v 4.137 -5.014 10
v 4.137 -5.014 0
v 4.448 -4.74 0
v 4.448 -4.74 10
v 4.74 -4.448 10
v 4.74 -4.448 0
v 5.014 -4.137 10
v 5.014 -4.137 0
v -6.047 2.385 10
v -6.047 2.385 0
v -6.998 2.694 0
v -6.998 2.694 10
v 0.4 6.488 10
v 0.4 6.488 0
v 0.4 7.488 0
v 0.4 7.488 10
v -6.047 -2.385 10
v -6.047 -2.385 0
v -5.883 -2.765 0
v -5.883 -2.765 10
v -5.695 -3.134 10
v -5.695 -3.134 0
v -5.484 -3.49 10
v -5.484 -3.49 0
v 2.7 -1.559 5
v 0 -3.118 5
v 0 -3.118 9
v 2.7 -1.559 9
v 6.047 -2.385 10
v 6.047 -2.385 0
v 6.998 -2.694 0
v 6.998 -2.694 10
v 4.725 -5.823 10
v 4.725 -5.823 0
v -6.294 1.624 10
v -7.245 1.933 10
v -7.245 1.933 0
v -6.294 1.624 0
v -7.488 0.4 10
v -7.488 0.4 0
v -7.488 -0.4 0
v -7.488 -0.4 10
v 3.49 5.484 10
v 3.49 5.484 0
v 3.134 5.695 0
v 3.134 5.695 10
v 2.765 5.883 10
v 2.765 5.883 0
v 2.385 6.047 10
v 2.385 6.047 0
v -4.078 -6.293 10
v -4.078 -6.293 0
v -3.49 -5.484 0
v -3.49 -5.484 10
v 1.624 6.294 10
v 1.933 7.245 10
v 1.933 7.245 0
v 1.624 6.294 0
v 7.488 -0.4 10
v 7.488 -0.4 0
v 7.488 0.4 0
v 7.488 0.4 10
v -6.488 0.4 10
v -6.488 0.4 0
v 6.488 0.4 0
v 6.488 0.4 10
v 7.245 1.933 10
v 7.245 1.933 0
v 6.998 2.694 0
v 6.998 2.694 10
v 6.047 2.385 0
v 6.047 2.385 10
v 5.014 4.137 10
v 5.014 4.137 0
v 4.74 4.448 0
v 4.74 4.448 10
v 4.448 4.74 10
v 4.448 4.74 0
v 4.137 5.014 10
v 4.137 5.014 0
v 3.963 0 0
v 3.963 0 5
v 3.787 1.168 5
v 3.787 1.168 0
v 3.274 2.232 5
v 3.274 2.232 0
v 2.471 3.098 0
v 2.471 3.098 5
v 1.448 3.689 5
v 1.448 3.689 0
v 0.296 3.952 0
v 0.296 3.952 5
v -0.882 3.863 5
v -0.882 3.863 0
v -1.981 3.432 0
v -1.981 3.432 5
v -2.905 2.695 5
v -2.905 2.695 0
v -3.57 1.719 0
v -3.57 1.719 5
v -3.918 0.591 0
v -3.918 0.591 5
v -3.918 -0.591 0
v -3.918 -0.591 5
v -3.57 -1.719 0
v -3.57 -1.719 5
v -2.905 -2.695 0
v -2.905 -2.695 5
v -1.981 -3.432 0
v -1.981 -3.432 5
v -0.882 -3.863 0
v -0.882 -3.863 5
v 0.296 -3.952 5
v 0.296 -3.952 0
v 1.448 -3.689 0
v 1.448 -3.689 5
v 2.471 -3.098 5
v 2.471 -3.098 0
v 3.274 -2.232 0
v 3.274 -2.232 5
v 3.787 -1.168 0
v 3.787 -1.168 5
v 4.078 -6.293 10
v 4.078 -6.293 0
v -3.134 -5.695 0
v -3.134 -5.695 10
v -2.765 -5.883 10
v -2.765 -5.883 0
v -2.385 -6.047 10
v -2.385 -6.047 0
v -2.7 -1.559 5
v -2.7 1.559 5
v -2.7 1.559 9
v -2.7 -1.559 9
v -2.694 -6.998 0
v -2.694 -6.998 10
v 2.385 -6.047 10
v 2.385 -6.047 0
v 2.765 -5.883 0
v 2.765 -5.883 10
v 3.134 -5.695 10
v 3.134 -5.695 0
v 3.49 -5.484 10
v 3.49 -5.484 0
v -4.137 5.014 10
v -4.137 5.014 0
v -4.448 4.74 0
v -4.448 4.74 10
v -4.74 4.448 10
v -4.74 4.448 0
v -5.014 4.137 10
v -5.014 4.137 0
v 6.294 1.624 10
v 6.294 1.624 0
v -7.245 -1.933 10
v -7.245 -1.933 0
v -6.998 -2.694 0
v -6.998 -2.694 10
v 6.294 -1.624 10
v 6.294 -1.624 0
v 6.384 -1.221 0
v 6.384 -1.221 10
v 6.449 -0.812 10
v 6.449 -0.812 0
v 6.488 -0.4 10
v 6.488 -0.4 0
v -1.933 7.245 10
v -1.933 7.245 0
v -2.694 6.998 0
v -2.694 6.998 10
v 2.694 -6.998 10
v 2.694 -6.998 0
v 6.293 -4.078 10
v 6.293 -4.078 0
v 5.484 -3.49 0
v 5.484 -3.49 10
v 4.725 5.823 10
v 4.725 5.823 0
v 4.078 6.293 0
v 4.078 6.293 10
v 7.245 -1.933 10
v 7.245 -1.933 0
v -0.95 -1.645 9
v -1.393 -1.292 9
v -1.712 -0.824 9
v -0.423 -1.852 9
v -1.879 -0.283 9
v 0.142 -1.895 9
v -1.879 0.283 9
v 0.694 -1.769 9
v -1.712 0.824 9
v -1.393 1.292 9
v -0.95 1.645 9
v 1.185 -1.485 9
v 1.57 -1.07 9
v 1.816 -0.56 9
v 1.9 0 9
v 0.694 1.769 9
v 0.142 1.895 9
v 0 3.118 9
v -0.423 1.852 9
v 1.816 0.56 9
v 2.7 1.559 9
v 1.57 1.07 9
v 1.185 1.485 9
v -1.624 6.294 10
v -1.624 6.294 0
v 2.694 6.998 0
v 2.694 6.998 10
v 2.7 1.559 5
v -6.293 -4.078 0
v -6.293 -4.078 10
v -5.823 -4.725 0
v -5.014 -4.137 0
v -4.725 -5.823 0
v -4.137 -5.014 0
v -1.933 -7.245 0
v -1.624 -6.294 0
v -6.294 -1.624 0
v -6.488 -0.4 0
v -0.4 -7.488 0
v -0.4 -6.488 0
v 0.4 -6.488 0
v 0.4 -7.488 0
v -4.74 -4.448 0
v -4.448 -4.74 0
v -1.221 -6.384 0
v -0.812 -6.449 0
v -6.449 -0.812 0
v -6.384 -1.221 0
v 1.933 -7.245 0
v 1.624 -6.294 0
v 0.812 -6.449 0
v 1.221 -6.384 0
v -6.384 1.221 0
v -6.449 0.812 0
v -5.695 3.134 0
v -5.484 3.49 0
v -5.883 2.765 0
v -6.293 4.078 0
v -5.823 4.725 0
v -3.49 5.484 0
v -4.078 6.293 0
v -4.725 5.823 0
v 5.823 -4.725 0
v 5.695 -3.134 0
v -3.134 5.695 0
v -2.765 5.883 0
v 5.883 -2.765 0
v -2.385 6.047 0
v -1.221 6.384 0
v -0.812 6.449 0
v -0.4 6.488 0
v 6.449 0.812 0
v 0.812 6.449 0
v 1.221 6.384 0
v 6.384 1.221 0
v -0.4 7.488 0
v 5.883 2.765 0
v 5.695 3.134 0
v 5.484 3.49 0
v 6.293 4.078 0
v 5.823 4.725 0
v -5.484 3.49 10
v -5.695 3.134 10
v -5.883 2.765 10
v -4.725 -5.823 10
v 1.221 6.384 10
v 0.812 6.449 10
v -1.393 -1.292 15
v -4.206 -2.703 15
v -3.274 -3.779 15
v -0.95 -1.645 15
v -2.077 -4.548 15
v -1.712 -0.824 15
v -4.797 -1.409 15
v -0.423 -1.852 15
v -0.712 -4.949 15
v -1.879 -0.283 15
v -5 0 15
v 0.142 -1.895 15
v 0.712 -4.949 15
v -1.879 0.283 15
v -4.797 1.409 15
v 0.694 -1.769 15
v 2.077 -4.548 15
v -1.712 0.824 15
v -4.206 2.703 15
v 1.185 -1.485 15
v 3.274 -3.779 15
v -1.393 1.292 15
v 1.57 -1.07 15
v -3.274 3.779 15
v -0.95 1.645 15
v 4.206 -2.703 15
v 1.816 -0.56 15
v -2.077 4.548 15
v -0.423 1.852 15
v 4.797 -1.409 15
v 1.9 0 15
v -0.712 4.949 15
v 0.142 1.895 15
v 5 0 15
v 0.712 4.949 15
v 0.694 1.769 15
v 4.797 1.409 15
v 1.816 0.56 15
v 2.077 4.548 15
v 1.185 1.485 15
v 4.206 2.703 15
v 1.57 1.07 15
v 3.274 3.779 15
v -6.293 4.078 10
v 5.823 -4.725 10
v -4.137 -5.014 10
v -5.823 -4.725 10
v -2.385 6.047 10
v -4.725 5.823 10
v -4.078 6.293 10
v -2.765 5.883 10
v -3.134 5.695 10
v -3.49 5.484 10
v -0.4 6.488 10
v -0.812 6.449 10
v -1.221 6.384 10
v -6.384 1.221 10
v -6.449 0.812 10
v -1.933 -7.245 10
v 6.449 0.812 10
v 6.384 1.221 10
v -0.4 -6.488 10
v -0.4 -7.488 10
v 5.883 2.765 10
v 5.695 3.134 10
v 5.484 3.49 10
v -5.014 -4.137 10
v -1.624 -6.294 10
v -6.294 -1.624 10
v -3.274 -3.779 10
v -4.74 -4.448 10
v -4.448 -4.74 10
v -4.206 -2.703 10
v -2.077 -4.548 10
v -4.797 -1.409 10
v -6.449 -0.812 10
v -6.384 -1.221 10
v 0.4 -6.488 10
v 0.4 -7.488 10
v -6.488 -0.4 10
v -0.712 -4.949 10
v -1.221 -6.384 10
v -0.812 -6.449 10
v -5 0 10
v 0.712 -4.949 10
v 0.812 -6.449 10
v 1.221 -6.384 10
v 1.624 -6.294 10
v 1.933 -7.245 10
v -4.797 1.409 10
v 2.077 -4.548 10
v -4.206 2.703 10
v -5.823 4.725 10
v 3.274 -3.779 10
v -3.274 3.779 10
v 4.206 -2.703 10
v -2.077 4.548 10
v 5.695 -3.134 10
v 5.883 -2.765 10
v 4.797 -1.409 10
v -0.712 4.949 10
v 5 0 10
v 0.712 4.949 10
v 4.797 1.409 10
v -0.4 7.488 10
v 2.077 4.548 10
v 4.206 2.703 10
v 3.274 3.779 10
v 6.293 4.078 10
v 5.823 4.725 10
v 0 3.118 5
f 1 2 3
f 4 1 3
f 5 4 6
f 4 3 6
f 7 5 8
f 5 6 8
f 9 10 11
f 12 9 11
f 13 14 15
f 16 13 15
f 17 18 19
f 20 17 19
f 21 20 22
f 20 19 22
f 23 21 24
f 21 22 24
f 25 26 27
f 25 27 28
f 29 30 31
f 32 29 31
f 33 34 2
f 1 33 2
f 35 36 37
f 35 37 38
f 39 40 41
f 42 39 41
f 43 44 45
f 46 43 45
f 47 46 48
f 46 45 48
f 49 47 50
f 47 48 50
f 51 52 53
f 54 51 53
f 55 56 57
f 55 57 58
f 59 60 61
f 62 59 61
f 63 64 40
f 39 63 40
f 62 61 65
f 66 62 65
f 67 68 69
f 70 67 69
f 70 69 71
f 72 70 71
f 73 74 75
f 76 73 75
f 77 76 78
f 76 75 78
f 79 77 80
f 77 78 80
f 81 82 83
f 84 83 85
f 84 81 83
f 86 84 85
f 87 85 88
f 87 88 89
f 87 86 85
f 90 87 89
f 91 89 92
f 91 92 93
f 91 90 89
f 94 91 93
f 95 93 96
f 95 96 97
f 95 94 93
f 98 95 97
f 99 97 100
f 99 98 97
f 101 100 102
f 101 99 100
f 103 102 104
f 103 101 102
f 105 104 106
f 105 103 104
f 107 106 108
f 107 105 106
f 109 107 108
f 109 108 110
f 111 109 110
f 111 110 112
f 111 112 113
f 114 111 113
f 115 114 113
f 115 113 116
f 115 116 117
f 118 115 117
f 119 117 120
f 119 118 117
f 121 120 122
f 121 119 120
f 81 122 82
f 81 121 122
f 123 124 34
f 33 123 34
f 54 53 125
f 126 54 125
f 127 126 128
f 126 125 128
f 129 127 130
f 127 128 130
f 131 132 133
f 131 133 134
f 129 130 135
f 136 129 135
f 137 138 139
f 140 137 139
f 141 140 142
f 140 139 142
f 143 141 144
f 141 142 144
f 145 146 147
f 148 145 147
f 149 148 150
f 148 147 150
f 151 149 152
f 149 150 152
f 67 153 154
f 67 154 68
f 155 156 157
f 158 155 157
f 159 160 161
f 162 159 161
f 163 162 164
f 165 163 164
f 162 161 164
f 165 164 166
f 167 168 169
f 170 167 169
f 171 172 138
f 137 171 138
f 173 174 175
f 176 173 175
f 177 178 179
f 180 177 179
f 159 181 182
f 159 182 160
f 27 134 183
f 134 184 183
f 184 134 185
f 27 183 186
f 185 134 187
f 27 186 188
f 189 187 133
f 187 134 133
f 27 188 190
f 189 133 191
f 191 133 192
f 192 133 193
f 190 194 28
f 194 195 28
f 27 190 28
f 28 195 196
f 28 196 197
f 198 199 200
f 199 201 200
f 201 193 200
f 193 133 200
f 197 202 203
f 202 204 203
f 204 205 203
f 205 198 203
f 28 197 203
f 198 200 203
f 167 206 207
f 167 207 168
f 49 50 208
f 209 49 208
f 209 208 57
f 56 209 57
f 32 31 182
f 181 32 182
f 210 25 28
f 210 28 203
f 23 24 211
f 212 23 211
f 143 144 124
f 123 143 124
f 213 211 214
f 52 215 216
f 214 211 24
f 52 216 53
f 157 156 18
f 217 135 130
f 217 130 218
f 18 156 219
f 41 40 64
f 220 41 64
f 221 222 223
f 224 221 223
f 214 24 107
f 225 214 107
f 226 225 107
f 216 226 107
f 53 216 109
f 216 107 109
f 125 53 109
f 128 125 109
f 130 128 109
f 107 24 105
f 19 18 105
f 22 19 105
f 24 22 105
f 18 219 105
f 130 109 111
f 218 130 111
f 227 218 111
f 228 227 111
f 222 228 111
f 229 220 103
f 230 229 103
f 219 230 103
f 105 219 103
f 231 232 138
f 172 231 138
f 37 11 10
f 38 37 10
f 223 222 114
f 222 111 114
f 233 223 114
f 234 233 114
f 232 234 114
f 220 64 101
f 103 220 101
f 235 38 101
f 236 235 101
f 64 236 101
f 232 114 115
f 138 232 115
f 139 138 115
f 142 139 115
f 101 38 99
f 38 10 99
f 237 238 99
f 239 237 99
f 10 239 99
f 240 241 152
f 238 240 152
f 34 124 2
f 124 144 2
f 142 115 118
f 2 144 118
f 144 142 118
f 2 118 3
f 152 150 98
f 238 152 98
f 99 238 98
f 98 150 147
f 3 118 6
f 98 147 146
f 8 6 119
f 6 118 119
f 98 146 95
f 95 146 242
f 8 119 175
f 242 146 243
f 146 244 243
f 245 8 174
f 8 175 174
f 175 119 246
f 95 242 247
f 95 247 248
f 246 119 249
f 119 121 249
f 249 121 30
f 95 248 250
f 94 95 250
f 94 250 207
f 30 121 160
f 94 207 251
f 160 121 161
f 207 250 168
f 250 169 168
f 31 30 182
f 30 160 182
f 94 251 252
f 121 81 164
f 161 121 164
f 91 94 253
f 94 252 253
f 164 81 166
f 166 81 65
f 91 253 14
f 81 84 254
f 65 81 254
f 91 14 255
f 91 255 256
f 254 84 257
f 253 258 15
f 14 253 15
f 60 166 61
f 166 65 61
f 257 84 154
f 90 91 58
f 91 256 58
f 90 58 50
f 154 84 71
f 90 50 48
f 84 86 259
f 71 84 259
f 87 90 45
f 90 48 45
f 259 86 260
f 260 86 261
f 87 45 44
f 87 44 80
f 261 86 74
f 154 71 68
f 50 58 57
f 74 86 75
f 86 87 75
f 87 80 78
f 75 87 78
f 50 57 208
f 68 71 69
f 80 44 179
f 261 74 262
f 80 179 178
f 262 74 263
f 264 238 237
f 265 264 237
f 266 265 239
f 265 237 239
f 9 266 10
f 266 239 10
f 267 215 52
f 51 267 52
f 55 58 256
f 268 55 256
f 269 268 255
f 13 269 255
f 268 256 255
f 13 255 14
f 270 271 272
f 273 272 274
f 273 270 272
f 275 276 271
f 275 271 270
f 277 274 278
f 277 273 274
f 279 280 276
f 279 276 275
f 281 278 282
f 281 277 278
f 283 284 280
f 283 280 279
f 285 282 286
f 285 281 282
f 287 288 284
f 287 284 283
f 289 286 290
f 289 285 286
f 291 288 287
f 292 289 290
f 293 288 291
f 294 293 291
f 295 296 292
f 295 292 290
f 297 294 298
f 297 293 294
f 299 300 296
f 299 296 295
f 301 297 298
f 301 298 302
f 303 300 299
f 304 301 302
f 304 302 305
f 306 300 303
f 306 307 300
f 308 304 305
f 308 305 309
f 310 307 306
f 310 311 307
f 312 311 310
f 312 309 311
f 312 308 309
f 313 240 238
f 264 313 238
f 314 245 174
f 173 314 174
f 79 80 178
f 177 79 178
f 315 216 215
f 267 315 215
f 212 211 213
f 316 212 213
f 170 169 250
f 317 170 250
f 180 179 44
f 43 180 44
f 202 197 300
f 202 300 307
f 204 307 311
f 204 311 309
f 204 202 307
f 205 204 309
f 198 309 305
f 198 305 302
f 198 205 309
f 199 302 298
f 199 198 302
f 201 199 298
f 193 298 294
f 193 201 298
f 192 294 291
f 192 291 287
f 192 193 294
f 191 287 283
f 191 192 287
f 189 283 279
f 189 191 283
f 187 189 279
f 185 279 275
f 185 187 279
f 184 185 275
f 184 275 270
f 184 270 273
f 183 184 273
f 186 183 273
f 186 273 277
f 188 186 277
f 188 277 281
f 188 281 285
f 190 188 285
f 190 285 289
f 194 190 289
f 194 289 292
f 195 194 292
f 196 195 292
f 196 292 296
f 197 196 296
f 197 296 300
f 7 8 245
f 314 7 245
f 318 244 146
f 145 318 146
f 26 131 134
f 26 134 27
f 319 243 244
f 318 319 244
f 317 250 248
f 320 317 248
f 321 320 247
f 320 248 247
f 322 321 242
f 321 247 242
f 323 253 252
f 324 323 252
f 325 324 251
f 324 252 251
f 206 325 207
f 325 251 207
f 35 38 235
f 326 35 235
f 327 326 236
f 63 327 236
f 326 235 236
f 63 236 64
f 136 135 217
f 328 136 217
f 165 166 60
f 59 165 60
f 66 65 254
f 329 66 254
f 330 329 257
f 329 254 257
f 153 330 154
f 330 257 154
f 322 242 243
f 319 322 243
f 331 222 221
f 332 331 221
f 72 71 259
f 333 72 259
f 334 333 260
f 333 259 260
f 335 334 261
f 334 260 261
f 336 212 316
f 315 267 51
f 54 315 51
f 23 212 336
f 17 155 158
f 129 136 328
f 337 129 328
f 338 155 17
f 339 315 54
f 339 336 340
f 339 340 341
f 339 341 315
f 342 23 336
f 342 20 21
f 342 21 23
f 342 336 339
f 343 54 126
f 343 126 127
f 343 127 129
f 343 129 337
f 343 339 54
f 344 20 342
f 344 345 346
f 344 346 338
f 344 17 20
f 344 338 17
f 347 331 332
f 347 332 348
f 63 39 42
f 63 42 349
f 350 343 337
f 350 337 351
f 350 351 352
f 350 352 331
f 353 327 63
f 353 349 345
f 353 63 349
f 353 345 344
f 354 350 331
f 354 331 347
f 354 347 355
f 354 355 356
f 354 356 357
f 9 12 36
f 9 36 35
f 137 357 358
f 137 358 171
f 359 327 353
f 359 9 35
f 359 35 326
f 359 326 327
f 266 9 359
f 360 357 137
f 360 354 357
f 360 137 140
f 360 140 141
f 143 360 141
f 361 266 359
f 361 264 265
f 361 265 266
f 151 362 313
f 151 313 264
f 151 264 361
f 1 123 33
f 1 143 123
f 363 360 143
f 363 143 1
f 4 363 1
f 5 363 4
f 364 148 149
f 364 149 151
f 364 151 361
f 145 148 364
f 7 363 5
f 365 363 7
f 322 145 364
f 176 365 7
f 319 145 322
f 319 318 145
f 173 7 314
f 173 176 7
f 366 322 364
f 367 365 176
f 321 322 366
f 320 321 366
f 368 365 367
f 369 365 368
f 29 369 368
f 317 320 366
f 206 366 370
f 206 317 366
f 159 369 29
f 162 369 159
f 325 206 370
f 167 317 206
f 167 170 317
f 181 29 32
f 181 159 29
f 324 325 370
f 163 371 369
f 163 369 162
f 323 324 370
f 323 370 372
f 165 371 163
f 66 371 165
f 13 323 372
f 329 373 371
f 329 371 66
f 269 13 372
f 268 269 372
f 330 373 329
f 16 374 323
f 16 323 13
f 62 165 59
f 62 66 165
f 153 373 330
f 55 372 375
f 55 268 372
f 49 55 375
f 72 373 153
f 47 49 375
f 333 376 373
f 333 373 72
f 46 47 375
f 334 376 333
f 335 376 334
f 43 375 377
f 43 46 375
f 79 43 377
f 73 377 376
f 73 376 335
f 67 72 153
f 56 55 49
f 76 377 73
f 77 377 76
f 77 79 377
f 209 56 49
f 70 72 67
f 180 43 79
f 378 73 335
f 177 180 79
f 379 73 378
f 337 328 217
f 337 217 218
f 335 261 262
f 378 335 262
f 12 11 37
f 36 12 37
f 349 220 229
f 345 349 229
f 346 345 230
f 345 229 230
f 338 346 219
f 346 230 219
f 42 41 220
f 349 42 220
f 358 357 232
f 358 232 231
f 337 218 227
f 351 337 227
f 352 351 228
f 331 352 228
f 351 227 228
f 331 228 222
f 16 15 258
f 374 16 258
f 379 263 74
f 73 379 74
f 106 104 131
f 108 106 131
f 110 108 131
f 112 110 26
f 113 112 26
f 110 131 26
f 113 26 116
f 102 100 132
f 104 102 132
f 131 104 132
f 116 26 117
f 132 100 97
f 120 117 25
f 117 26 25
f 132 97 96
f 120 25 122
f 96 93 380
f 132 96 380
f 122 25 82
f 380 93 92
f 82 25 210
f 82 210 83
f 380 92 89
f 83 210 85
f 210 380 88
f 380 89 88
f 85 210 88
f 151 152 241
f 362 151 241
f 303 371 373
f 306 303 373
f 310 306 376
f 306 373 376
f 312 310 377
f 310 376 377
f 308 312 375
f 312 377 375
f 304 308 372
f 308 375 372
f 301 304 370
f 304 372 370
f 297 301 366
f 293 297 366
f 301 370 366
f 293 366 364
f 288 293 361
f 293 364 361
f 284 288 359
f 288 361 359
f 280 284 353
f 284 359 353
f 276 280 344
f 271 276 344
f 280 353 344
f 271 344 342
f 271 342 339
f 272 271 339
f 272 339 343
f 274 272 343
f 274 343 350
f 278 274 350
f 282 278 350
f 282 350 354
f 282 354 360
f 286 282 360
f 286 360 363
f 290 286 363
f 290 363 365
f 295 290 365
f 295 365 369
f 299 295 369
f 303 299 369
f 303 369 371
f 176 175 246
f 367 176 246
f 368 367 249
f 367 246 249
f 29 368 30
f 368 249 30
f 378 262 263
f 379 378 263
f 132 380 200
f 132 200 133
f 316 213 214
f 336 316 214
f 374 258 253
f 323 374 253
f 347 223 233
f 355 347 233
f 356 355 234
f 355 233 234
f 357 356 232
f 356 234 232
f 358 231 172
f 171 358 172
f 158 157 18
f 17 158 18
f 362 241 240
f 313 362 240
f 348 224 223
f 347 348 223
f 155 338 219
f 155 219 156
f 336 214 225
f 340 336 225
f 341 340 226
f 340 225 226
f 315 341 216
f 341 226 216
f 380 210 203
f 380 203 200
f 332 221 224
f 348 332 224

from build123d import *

# Parameters (mm, degrees)
F0_R     = 5
F0_R_2   = 1.9
F1_DEPTH = 15
F2_DEPTH = 10
F3_R     = 3.962687
F4_DEPTH = 5
F3_R_2   = 1.9
F5_DEPTH = 9


with BuildPart() as f1:
    # F0 (on Top) → F1 (new body)
    with BuildSketch(Plane.XY):
        Circle(F0_R)
        Circle(F0_R_2, mode=Mode.SUBTRACT)
    extrude(amount=F1_DEPTH)

    # F0 (on Top) → F2 (join)
    with BuildSketch(Plane.XY):
        with BuildLine():
            ThreePointArc((6.487681, -0.4), (6.496919, -0.200095), (6.5, 0))
            ThreePointArc((6.5, 0), (6.496919, 0.200095), (6.487681, 0.4))
            ThreePointArc((6.487681, 0.4), (6.419974, 1.016824), (6.293758, 1.624381))
            ThreePointArc((6.293758, 1.624381), (6.181867, 2.00861), (6.046544, 2.385226))
            ThreePointArc((6.046544, 2.385226), (5.791542, 2.950938), (5.483758, 3.489756))
            ThreePointArc((5.483758, 3.489756), (5.25861, 3.820604), (5.01353, 4.13697))
            ThreePointArc((5.01353, 4.13697), (4.596194, 4.596194), (4.13697, 5.01353))
            ThreePointArc((4.13697, 5.01353), (3.820604, 5.25861), (3.489756, 5.483758))
            ThreePointArc((3.489756, 5.483758), (2.950938, 5.791542), (2.385226, 6.046544))
            ThreePointArc((2.385226, 6.046544), (2.00861, 6.181867), (1.624381, 6.293758))
            ThreePointArc((1.624381, 6.293758), (1.016824, 6.419974), (0.4, 6.487681))
            ThreePointArc((0.4, 6.487681), (0, 6.5), (-0.4, 6.487681))
            ThreePointArc((-0.4, 6.487681), (-1.016824, 6.419974), (-1.624381, 6.293758))
            ThreePointArc((-1.624381, 6.293758), (-2.00861, 6.181867), (-2.385226, 6.046544))
            ThreePointArc((-2.385226, 6.046544), (-2.950938, 5.791542), (-3.489756, 5.483758))
            ThreePointArc((-3.489756, 5.483758), (-3.820604, 5.25861), (-4.13697, 5.01353))
            ThreePointArc((-4.13697, 5.01353), (-4.596194, 4.596194), (-5.01353, 4.13697))
            ThreePointArc((-5.01353, 4.13697), (-5.25861, 3.820604), (-5.483758, 3.489756))
            ThreePointArc((-5.483758, 3.489756), (-5.791542, 2.950938), (-6.046544, 2.385226))
            ThreePointArc((-6.046544, 2.385226), (-6.181867, 2.00861), (-6.293758, 1.624381))
            ThreePointArc((-6.293758, 1.624381), (-6.419974, 1.016824), (-6.487681, 0.4))
            ThreePointArc((-6.487681, 0.4), (-6.5, 0), (-6.487681, -0.4))
            ThreePointArc((-6.487681, -0.4), (-6.419974, -1.016824), (-6.293758, -1.624381))
            ThreePointArc((-6.293758, -1.624381), (-6.181867, -2.00861), (-6.046544, -2.385226))
            ThreePointArc((-6.046544, -2.385226), (-5.791542, -2.950938), (-5.483758, -3.489756))
            ThreePointArc((-5.483758, -3.489756), (-5.25861, -3.820604), (-5.01353, -4.13697))
            ThreePointArc((-5.01353, -4.13697), (-4.596194, -4.596194), (-4.13697, -5.01353))
            ThreePointArc((-4.13697, -5.01353), (-3.820604, -5.25861), (-3.489756, -5.483758))
            ThreePointArc((-3.489756, -5.483758), (-2.950938, -5.791542), (-2.385226, -6.046544))
            ThreePointArc((-2.385226, -6.046544), (-2.00861, -6.181867), (-1.624381, -6.293758))
            ThreePointArc((-1.624381, -6.293758), (-1.016824, -6.419974), (-0.4, -6.487681))
            ThreePointArc((-0.4, -6.487681), (0, -6.5), (0.4, -6.487681))
            ThreePointArc((0.4, -6.487681), (1.016824, -6.419974), (1.624381, -6.293758))
            ThreePointArc((1.624381, -6.293758), (2.00861, -6.181867), (2.385226, -6.046544))
            ThreePointArc((2.385226, -6.046544), (2.950938, -5.791542), (3.489756, -5.483758))
            ThreePointArc((3.489756, -5.483758), (3.820604, -5.25861), (4.13697, -5.01353))
            ThreePointArc((4.13697, -5.01353), (4.596194, -4.596194), (5.01353, -4.13697))
            ThreePointArc((5.01353, -4.13697), (5.25861, -3.820604), (5.483758, -3.489756))
            ThreePointArc((5.483758, -3.489756), (5.791542, -2.950938), (6.046544, -2.385226))
            ThreePointArc((6.046544, -2.385226), (6.181867, -2.00861), (6.293758, -1.624381))
            ThreePointArc((6.293758, -1.624381), (6.419974, -1.016824), (6.487681, -0.4))
        make_face()
        Circle(F0_R, mode=Mode.SUBTRACT)
        with BuildLine():
            ThreePointArc((-5.483758, 3.489756), (-5.25861, 3.820604), (-5.01353, 4.13697))
            Line((-5.01353, 4.13697), (-5.822547, 4.724755))
            Line((-5.822547, 4.724755), (-6.292775, 4.077541))
            Line((-6.292775, 4.077541), (-5.483758, 3.489756))
        make_face()
        with BuildLine():
            ThreePointArc((-4.13697, 5.01353), (-3.820604, 5.25861), (-3.489756, 5.483758))
            Line((-3.489756, 5.483758), (-4.077541, 6.292775))
            Line((-4.077541, 6.292775), (-4.724755, 5.822547))
            Line((-4.724755, 5.822547), (-4.13697, 5.01353))
        make_face()
        with BuildLine():
            ThreePointArc((-6.487681, -0.4), (-6.5, 0), (-6.487681, 0.4))
            Line((-6.487681, 0.4), (-7.487681, 0.4))
            Line((-7.487681, 0.4), (-7.487681, -0.4))
            Line((-7.487681, -0.4), (-6.487681, -0.4))
        make_face()
        with BuildLine():
            Line((-6.997601, -2.694243), (-6.046544, -2.385226))
            ThreePointArc((-6.046544, -2.385226), (-6.181867, -2.00861), (-6.293758, -1.624381))
            Line((-6.293758, -1.624381), (-7.244814, -1.933398))
            Line((-7.244814, -1.933398), (-6.997601, -2.694243))
        make_face()
        with BuildLine():
            ThreePointArc((-6.293758, 1.624381), (-6.181867, 2.00861), (-6.046544, 2.385226))
            Line((-6.046544, 2.385226), (-6.997601, 2.694243))
            Line((-6.997601, 2.694243), (-7.244814, 1.933398))
            Line((-7.244814, 1.933398), (-6.293758, 1.624381))
        make_face()
        with BuildLine():
            Line((-5.822547, -4.724755), (-5.01353, -4.13697))
            ThreePointArc((-5.01353, -4.13697), (-5.25861, -3.820604), (-5.483758, -3.489756))
            Line((-5.483758, -3.489756), (-6.292775, -4.077541))
            Line((-6.292775, -4.077541), (-5.822547, -4.724755))
        make_face()
        with BuildLine():
            Line((-4.077541, -6.292775), (-3.489756, -5.483758))
            ThreePointArc((-3.489756, -5.483758), (-3.820604, -5.25861), (-4.13697, -5.01353))
            Line((-4.13697, -5.01353), (-4.724755, -5.822547))
            Line((-4.724755, -5.822547), (-4.077541, -6.292775))
        make_face()
        with BuildLine():
            Line((-1.933398, -7.244814), (-1.624381, -6.293758))
            ThreePointArc((-1.624381, -6.293758), (-2.00861, -6.181867), (-2.385226, -6.046544))
            Line((-2.385226, -6.046544), (-2.694243, -6.997601))
            Line((-2.694243, -6.997601), (-1.933398, -7.244814))
        make_face()
        with BuildLine():
            Line((0.4, -7.487681), (0.4, -6.487681))
            ThreePointArc((0.4, -6.487681), (0, -6.5), (-0.4, -6.487681))
            Line((-0.4, -6.487681), (-0.4, -7.487681))
            Line((-0.4, -7.487681), (0.4, -7.487681))
        make_face()
        with BuildLine():
            Line((2.694243, -6.997601), (2.385226, -6.046544))
            ThreePointArc((2.385226, -6.046544), (2.00861, -6.181867), (1.624381, -6.293758))
            Line((1.624381, -6.293758), (1.933398, -7.244814))
            Line((1.933398, -7.244814), (2.694243, -6.997601))
        make_face()
        with BuildLine():
            Line((4.724755, -5.822547), (4.13697, -5.01353))
            ThreePointArc((4.13697, -5.01353), (3.820604, -5.25861), (3.489756, -5.483758))
            Line((3.489756, -5.483758), (4.077541, -6.292775))
            Line((4.077541, -6.292775), (4.724755, -5.822547))
        make_face()
        with BuildLine():
            Line((7.244814, -1.933398), (6.293758, -1.624381))
            ThreePointArc((6.293758, -1.624381), (6.181867, -2.00861), (6.046544, -2.385226))
            Line((6.046544, -2.385226), (6.997601, -2.694243))
            Line((6.997601, -2.694243), (7.244814, -1.933398))
        make_face()
        with BuildLine():
            ThreePointArc((6.487681, 0.4), (6.496919, 0.200095), (6.5, 0))
            ThreePointArc((6.5, 0), (6.496919, -0.200095), (6.487681, -0.4))
            Line((6.487681, -0.4), (7.487681, -0.4))
            Line((7.487681, -0.4), (7.487681, 0.4))
            Line((7.487681, 0.4), (6.487681, 0.4))
        make_face()
        with BuildLine():
            ThreePointArc((6.046544, 2.385226), (6.181867, 2.00861), (6.293758, 1.624381))
            Line((6.293758, 1.624381), (7.244814, 1.933398))
            Line((7.244814, 1.933398), (6.997601, 2.694243))
            Line((6.997601, 2.694243), (6.046544, 2.385226))
        make_face()
        with BuildLine():
            ThreePointArc((3.489756, 5.483758), (3.820604, 5.25861), (4.13697, 5.01353))
            Line((4.13697, 5.01353), (4.724755, 5.822547))
            Line((4.724755, 5.822547), (4.077541, 6.292775))
            Line((4.077541, 6.292775), (3.489756, 5.483758))
        make_face()
        with BuildLine():
            Line((6.292775, -4.077541), (5.483758, -3.489756))
            ThreePointArc((5.483758, -3.489756), (5.25861, -3.820604), (5.01353, -4.13697))
            Line((5.01353, -4.13697), (5.822547, -4.724755))
            Line((5.822547, -4.724755), (6.292775, -4.077541))
        make_face()
        with BuildLine():
            ThreePointArc((5.01353, 4.13697), (5.25861, 3.820604), (5.483758, 3.489756))
            Line((5.483758, 3.489756), (6.292775, 4.077541))
            Line((6.292775, 4.077541), (5.822547, 4.724755))
            Line((5.822547, 4.724755), (5.01353, 4.13697))
        make_face()
        with BuildLine():
            ThreePointArc((1.624381, 6.293758), (2.00861, 6.181867), (2.385226, 6.046544))
            Line((2.385226, 6.046544), (2.694243, 6.997601))
            Line((2.694243, 6.997601), (1.933398, 7.244814))
            Line((1.933398, 7.244814), (1.624381, 6.293758))
        make_face()
        with BuildLine():
            ThreePointArc((-2.385226, 6.046544), (-2.00861, 6.181867), (-1.624381, 6.293758))
            Line((-1.624381, 6.293758), (-1.933398, 7.244814))
            Line((-1.933398, 7.244814), (-2.694243, 6.997601))
            Line((-2.694243, 6.997601), (-2.385226, 6.046544))
        make_face()
        with BuildLine():
            ThreePointArc((-0.4, 6.487681), (0, 6.5), (0.4, 6.487681))
            Line((0.4, 6.487681), (0.4, 7.487681))
            Line((0.4, 7.487681), (-0.4, 7.487681))
            Line((-0.4, 7.487681), (-0.4, 6.487681))
        make_face()
    extrude(amount=F2_DEPTH)

    # F3 (on face) → F4 (cut)
    with BuildSketch(Plane.XY):
        Circle(F3_R)
        Polygon((-2.7, 1.558846), (0, 3.117691), (2.7, 1.558846), (2.7, -1.558846), (0, -3.117691), (-2.7, -1.558846), align=None, mode=Mode.SUBTRACT)
    extrude(amount=F4_DEPTH, mode=Mode.SUBTRACT)

    # F3 (on face) → F5 (cut)
    with BuildSketch(Plane.XY):
        Polygon((2.7, 1.558846), (0, 3.117691), (-2.7, 1.558846), (-2.7, -1.558846), (0, -3.117691), (2.7, -1.558846), align=None)
        Circle(F3_R_2, mode=Mode.SUBTRACT)
    extrude(amount=F5_DEPTH, mode=Mode.SUBTRACT)


solid = f1.part
